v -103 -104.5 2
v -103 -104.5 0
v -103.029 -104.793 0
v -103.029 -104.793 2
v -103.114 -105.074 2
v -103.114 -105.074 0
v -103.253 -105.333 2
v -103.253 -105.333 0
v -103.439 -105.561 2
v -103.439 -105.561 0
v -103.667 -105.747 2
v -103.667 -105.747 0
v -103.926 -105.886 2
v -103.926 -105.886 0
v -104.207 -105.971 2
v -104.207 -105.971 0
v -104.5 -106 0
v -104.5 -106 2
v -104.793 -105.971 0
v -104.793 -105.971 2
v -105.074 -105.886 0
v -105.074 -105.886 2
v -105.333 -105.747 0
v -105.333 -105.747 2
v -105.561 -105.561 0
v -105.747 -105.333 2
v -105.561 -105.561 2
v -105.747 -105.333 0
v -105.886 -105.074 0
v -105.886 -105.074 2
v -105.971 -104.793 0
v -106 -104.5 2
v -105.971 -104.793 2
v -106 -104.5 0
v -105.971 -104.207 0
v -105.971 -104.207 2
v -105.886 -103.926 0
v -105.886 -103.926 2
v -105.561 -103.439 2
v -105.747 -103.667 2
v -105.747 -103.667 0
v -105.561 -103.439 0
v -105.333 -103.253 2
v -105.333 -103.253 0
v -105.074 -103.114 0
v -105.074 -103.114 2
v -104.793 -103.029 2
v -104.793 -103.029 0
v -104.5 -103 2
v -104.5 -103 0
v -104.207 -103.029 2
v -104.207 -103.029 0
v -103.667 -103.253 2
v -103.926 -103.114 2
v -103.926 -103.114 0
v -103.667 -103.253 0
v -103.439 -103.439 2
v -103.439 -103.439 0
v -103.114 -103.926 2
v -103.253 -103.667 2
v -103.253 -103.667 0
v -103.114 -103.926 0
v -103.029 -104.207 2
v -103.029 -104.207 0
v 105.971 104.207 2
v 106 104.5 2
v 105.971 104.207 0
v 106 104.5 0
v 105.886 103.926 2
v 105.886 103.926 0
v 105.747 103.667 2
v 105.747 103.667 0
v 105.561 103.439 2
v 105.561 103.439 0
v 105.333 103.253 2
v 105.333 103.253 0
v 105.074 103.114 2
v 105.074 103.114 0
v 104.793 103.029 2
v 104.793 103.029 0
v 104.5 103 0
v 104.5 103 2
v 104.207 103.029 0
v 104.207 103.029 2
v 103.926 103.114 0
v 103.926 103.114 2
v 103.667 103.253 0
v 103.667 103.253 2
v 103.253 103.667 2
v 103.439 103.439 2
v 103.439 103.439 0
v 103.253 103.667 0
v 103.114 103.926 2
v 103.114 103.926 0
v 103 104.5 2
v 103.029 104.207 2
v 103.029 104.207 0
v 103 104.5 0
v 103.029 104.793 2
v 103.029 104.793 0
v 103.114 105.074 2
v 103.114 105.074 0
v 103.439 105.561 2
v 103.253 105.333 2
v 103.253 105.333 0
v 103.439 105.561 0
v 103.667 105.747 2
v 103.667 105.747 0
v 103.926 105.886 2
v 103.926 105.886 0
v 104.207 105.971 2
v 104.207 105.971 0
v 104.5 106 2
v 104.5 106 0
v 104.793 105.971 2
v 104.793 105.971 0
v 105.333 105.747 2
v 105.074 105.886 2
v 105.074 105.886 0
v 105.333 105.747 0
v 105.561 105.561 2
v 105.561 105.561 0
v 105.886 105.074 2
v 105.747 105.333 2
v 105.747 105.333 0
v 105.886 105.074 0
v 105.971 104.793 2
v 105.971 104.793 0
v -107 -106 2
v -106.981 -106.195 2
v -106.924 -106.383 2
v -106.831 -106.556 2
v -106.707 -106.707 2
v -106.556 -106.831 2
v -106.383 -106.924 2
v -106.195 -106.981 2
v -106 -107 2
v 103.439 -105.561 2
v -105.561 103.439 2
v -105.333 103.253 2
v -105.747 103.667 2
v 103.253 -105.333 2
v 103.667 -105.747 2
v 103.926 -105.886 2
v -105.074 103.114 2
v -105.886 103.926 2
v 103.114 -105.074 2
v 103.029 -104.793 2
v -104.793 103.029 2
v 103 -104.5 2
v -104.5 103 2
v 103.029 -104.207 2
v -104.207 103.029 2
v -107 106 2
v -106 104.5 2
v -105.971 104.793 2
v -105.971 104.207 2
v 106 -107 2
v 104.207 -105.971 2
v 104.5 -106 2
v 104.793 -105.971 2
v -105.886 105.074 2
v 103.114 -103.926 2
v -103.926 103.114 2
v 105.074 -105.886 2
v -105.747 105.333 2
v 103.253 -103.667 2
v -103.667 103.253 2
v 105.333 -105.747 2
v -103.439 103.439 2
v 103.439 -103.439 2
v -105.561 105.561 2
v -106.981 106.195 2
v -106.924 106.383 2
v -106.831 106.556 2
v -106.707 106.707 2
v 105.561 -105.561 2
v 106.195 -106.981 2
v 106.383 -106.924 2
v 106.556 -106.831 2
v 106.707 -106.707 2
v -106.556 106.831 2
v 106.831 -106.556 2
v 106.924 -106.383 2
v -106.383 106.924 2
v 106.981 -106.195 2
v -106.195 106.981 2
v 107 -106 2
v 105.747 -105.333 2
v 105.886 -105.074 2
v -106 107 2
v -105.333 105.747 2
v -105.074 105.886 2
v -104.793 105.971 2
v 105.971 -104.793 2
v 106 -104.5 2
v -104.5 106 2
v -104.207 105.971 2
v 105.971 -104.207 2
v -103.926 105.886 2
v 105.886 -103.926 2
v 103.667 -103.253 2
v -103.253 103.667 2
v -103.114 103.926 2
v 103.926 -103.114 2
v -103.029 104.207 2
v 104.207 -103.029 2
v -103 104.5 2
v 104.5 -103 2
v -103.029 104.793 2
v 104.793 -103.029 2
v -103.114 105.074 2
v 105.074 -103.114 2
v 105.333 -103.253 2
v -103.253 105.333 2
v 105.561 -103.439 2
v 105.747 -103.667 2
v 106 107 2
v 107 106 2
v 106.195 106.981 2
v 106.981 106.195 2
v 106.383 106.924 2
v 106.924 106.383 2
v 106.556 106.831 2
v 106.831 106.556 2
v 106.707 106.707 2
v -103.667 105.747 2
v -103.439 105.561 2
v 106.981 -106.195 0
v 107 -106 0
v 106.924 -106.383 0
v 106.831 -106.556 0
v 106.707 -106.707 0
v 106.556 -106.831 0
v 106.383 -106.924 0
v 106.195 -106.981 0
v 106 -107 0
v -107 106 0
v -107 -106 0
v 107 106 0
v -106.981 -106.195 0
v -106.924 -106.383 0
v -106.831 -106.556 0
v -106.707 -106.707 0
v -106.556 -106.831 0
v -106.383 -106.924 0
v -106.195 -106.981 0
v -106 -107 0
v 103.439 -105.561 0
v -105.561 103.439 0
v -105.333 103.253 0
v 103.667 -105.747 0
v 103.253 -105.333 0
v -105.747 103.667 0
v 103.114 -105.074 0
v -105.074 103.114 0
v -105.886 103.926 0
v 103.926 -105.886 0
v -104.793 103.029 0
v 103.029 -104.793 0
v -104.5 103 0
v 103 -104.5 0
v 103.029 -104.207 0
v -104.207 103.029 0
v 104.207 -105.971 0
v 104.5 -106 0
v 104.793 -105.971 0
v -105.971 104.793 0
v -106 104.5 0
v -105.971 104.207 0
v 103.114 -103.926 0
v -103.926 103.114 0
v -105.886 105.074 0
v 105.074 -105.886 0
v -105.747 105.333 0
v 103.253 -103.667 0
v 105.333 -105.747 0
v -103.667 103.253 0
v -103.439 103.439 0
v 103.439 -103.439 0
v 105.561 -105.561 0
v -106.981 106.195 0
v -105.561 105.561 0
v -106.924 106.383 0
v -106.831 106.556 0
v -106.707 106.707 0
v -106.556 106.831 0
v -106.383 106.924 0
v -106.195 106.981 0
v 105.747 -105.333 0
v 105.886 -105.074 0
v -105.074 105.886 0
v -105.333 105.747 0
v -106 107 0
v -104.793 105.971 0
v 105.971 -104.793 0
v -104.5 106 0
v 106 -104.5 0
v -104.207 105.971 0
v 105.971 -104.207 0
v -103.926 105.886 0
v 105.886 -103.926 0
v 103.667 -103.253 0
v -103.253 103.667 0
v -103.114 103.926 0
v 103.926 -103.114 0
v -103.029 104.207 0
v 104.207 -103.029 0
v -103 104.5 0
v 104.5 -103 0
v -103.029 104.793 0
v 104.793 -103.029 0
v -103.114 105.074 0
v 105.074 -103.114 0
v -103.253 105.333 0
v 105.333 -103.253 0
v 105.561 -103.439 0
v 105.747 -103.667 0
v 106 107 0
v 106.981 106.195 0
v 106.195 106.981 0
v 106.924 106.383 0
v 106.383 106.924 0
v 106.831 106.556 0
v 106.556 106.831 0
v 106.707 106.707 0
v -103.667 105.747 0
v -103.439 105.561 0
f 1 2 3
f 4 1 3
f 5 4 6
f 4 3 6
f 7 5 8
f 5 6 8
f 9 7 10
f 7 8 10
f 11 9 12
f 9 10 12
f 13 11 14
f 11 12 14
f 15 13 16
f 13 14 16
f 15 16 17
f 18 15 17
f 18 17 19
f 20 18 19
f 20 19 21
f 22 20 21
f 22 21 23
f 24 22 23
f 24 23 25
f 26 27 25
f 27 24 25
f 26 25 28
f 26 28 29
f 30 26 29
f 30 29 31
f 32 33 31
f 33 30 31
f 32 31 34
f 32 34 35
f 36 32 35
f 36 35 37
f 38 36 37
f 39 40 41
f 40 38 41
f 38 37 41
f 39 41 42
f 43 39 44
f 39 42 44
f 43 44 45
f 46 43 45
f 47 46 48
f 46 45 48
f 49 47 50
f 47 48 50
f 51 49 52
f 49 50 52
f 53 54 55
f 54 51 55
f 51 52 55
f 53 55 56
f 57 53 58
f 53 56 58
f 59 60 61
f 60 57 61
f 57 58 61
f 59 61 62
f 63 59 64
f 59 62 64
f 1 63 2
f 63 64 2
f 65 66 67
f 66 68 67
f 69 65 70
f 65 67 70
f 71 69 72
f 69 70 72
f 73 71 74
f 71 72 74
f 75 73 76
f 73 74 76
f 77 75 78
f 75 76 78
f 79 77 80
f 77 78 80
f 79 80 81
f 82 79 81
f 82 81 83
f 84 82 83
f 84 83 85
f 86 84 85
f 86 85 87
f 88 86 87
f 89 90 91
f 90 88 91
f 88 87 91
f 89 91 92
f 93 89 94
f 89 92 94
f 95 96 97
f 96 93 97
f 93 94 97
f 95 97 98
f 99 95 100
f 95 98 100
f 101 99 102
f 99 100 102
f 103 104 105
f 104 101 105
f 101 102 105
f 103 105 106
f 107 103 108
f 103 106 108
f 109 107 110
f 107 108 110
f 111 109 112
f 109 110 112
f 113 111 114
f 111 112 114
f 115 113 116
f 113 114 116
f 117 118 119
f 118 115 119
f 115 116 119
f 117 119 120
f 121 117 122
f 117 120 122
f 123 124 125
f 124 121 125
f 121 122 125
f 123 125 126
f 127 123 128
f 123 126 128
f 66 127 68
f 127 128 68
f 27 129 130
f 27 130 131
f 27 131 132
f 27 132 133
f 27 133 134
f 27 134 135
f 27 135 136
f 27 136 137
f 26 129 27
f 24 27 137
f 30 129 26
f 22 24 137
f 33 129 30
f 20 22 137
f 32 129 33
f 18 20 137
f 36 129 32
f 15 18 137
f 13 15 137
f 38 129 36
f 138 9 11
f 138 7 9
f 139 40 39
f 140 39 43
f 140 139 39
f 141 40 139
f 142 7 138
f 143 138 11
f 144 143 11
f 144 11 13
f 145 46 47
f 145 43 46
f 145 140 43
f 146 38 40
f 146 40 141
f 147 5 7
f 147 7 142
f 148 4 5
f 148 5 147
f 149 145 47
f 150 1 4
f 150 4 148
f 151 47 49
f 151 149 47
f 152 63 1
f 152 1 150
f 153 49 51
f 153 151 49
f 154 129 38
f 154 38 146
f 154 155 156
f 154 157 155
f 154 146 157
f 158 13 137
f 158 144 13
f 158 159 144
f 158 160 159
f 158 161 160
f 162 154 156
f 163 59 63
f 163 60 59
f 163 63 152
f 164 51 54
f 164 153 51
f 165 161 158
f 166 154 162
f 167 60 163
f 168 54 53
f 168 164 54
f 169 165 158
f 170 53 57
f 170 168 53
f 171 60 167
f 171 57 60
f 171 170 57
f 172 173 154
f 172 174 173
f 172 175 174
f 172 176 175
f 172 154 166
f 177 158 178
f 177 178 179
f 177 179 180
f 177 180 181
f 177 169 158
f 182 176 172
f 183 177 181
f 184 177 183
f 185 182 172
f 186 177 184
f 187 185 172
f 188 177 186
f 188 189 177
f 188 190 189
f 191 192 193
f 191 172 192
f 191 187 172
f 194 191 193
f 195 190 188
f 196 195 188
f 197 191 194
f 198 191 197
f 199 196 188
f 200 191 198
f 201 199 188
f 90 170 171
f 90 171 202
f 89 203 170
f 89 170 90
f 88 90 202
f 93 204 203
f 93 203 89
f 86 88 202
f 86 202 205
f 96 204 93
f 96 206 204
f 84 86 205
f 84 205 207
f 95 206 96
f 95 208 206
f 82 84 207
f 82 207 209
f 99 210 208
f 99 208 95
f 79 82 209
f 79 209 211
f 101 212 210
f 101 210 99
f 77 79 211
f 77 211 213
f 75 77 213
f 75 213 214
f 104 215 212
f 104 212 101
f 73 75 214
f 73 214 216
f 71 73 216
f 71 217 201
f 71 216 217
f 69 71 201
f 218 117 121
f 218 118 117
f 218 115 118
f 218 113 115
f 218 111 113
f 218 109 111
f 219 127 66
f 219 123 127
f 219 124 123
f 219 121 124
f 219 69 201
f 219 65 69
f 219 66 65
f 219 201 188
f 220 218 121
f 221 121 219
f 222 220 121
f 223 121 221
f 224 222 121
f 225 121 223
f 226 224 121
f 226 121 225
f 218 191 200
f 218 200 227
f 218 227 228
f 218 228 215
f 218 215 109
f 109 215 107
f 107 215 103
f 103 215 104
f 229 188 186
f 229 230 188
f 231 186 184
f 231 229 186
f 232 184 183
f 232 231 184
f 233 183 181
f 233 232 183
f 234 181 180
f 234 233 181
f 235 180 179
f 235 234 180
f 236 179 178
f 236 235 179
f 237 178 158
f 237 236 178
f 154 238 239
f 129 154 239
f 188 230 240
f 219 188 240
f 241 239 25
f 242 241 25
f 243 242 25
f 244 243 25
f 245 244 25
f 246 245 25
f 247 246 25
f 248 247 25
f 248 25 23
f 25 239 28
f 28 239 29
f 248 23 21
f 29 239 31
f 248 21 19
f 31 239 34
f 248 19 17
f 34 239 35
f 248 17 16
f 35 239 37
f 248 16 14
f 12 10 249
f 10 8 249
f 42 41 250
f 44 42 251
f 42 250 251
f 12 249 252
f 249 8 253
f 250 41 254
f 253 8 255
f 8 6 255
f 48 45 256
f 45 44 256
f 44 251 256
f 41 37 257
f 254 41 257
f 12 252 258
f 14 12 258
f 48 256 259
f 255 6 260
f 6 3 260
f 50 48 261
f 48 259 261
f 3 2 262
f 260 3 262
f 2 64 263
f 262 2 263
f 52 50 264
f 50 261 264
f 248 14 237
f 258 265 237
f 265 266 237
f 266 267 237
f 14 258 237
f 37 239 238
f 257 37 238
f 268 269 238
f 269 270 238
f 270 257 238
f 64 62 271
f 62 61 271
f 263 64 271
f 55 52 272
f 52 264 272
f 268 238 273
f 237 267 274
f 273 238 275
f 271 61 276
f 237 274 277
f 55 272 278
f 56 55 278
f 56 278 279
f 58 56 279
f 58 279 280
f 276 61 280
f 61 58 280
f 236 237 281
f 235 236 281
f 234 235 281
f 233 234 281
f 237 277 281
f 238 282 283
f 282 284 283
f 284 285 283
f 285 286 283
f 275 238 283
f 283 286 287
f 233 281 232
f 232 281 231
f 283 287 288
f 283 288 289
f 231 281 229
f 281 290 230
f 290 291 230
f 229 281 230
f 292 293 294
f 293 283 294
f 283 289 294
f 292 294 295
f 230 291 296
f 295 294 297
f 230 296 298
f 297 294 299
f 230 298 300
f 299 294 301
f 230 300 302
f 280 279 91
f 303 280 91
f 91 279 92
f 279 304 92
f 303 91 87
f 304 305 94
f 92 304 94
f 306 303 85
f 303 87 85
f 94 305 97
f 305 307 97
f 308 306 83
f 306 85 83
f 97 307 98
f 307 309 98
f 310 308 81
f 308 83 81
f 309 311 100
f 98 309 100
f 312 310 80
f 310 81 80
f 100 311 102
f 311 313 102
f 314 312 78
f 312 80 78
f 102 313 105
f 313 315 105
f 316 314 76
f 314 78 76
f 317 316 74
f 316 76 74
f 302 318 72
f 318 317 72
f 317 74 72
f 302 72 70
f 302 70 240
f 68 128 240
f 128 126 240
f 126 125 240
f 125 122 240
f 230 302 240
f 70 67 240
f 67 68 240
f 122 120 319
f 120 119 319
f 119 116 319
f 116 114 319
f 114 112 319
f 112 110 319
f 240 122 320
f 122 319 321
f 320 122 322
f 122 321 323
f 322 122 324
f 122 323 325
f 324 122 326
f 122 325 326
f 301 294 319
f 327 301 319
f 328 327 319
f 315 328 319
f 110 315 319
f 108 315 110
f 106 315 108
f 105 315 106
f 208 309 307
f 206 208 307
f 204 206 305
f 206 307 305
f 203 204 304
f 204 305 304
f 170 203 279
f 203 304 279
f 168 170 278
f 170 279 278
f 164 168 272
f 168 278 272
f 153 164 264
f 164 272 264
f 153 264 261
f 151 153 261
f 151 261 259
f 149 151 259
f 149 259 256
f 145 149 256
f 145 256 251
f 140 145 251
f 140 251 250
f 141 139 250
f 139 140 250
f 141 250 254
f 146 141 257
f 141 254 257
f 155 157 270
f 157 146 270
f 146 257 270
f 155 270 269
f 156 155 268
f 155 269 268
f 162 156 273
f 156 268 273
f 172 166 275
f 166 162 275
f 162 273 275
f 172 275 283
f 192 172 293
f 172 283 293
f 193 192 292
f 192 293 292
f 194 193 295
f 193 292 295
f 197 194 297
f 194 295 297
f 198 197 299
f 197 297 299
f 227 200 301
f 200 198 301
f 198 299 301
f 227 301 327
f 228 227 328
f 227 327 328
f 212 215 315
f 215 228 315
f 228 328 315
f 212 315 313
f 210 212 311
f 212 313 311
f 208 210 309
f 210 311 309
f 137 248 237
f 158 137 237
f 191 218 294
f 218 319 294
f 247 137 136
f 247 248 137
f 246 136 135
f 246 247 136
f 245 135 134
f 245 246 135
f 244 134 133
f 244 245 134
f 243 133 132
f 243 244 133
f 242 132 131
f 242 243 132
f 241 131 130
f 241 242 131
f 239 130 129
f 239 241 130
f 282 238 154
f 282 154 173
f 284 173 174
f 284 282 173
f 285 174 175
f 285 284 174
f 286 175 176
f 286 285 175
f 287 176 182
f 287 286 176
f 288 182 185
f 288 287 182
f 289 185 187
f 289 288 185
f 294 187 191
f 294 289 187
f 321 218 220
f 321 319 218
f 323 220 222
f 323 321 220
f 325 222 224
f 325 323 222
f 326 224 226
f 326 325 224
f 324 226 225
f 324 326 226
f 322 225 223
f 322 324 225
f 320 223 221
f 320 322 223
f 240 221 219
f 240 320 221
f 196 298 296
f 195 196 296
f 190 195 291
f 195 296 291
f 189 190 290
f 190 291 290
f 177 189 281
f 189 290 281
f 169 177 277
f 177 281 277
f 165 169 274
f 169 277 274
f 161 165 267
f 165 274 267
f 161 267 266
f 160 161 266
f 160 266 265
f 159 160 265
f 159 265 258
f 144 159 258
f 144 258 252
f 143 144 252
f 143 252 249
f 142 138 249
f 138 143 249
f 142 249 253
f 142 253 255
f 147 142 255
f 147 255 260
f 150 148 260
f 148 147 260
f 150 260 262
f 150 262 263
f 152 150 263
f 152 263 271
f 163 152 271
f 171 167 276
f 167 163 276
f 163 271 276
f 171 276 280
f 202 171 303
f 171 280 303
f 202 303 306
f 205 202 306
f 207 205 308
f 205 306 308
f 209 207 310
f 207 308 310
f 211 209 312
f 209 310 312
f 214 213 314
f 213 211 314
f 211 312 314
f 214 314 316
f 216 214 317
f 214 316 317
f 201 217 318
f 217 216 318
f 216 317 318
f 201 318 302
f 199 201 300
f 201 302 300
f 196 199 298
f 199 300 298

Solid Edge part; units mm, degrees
sketch "Sketch1" plane through (0, 0, 0) normal (0, 0, 1) x (1, 0, 0)
  line L0 (-106, -107) -> (106, -107)
  arc A0 (106, -107) -> (107, -106) centre (106, -106) ccw
  line L1 (107, -106) -> (107, 106)
  arc A1 (107, 106) -> (106, 107) centre (106, 106) ccw
  line L2 (106, 107) -> (-106, 107)
  arc A2 (-107, 106) -> (-106, 107) centre (-106, 106) cw
  line L3 (-107, 106) -> (-107, -106)
  arc A3 (-107, -106) -> (-106, -107) centre (-106, -106) ccw
  circle A4 centre (104.5, 104.5) radius 1.5
  circle A5 centre (104.5, -104.5) radius 1.5
  circle A6 centre (-104.5, -104.5) radius 1.5
  circle A7 centre (-104.5, 104.5) radius 1.5
extrude "Protrusion1" add sketch "Sketch1" along normal blind 2
